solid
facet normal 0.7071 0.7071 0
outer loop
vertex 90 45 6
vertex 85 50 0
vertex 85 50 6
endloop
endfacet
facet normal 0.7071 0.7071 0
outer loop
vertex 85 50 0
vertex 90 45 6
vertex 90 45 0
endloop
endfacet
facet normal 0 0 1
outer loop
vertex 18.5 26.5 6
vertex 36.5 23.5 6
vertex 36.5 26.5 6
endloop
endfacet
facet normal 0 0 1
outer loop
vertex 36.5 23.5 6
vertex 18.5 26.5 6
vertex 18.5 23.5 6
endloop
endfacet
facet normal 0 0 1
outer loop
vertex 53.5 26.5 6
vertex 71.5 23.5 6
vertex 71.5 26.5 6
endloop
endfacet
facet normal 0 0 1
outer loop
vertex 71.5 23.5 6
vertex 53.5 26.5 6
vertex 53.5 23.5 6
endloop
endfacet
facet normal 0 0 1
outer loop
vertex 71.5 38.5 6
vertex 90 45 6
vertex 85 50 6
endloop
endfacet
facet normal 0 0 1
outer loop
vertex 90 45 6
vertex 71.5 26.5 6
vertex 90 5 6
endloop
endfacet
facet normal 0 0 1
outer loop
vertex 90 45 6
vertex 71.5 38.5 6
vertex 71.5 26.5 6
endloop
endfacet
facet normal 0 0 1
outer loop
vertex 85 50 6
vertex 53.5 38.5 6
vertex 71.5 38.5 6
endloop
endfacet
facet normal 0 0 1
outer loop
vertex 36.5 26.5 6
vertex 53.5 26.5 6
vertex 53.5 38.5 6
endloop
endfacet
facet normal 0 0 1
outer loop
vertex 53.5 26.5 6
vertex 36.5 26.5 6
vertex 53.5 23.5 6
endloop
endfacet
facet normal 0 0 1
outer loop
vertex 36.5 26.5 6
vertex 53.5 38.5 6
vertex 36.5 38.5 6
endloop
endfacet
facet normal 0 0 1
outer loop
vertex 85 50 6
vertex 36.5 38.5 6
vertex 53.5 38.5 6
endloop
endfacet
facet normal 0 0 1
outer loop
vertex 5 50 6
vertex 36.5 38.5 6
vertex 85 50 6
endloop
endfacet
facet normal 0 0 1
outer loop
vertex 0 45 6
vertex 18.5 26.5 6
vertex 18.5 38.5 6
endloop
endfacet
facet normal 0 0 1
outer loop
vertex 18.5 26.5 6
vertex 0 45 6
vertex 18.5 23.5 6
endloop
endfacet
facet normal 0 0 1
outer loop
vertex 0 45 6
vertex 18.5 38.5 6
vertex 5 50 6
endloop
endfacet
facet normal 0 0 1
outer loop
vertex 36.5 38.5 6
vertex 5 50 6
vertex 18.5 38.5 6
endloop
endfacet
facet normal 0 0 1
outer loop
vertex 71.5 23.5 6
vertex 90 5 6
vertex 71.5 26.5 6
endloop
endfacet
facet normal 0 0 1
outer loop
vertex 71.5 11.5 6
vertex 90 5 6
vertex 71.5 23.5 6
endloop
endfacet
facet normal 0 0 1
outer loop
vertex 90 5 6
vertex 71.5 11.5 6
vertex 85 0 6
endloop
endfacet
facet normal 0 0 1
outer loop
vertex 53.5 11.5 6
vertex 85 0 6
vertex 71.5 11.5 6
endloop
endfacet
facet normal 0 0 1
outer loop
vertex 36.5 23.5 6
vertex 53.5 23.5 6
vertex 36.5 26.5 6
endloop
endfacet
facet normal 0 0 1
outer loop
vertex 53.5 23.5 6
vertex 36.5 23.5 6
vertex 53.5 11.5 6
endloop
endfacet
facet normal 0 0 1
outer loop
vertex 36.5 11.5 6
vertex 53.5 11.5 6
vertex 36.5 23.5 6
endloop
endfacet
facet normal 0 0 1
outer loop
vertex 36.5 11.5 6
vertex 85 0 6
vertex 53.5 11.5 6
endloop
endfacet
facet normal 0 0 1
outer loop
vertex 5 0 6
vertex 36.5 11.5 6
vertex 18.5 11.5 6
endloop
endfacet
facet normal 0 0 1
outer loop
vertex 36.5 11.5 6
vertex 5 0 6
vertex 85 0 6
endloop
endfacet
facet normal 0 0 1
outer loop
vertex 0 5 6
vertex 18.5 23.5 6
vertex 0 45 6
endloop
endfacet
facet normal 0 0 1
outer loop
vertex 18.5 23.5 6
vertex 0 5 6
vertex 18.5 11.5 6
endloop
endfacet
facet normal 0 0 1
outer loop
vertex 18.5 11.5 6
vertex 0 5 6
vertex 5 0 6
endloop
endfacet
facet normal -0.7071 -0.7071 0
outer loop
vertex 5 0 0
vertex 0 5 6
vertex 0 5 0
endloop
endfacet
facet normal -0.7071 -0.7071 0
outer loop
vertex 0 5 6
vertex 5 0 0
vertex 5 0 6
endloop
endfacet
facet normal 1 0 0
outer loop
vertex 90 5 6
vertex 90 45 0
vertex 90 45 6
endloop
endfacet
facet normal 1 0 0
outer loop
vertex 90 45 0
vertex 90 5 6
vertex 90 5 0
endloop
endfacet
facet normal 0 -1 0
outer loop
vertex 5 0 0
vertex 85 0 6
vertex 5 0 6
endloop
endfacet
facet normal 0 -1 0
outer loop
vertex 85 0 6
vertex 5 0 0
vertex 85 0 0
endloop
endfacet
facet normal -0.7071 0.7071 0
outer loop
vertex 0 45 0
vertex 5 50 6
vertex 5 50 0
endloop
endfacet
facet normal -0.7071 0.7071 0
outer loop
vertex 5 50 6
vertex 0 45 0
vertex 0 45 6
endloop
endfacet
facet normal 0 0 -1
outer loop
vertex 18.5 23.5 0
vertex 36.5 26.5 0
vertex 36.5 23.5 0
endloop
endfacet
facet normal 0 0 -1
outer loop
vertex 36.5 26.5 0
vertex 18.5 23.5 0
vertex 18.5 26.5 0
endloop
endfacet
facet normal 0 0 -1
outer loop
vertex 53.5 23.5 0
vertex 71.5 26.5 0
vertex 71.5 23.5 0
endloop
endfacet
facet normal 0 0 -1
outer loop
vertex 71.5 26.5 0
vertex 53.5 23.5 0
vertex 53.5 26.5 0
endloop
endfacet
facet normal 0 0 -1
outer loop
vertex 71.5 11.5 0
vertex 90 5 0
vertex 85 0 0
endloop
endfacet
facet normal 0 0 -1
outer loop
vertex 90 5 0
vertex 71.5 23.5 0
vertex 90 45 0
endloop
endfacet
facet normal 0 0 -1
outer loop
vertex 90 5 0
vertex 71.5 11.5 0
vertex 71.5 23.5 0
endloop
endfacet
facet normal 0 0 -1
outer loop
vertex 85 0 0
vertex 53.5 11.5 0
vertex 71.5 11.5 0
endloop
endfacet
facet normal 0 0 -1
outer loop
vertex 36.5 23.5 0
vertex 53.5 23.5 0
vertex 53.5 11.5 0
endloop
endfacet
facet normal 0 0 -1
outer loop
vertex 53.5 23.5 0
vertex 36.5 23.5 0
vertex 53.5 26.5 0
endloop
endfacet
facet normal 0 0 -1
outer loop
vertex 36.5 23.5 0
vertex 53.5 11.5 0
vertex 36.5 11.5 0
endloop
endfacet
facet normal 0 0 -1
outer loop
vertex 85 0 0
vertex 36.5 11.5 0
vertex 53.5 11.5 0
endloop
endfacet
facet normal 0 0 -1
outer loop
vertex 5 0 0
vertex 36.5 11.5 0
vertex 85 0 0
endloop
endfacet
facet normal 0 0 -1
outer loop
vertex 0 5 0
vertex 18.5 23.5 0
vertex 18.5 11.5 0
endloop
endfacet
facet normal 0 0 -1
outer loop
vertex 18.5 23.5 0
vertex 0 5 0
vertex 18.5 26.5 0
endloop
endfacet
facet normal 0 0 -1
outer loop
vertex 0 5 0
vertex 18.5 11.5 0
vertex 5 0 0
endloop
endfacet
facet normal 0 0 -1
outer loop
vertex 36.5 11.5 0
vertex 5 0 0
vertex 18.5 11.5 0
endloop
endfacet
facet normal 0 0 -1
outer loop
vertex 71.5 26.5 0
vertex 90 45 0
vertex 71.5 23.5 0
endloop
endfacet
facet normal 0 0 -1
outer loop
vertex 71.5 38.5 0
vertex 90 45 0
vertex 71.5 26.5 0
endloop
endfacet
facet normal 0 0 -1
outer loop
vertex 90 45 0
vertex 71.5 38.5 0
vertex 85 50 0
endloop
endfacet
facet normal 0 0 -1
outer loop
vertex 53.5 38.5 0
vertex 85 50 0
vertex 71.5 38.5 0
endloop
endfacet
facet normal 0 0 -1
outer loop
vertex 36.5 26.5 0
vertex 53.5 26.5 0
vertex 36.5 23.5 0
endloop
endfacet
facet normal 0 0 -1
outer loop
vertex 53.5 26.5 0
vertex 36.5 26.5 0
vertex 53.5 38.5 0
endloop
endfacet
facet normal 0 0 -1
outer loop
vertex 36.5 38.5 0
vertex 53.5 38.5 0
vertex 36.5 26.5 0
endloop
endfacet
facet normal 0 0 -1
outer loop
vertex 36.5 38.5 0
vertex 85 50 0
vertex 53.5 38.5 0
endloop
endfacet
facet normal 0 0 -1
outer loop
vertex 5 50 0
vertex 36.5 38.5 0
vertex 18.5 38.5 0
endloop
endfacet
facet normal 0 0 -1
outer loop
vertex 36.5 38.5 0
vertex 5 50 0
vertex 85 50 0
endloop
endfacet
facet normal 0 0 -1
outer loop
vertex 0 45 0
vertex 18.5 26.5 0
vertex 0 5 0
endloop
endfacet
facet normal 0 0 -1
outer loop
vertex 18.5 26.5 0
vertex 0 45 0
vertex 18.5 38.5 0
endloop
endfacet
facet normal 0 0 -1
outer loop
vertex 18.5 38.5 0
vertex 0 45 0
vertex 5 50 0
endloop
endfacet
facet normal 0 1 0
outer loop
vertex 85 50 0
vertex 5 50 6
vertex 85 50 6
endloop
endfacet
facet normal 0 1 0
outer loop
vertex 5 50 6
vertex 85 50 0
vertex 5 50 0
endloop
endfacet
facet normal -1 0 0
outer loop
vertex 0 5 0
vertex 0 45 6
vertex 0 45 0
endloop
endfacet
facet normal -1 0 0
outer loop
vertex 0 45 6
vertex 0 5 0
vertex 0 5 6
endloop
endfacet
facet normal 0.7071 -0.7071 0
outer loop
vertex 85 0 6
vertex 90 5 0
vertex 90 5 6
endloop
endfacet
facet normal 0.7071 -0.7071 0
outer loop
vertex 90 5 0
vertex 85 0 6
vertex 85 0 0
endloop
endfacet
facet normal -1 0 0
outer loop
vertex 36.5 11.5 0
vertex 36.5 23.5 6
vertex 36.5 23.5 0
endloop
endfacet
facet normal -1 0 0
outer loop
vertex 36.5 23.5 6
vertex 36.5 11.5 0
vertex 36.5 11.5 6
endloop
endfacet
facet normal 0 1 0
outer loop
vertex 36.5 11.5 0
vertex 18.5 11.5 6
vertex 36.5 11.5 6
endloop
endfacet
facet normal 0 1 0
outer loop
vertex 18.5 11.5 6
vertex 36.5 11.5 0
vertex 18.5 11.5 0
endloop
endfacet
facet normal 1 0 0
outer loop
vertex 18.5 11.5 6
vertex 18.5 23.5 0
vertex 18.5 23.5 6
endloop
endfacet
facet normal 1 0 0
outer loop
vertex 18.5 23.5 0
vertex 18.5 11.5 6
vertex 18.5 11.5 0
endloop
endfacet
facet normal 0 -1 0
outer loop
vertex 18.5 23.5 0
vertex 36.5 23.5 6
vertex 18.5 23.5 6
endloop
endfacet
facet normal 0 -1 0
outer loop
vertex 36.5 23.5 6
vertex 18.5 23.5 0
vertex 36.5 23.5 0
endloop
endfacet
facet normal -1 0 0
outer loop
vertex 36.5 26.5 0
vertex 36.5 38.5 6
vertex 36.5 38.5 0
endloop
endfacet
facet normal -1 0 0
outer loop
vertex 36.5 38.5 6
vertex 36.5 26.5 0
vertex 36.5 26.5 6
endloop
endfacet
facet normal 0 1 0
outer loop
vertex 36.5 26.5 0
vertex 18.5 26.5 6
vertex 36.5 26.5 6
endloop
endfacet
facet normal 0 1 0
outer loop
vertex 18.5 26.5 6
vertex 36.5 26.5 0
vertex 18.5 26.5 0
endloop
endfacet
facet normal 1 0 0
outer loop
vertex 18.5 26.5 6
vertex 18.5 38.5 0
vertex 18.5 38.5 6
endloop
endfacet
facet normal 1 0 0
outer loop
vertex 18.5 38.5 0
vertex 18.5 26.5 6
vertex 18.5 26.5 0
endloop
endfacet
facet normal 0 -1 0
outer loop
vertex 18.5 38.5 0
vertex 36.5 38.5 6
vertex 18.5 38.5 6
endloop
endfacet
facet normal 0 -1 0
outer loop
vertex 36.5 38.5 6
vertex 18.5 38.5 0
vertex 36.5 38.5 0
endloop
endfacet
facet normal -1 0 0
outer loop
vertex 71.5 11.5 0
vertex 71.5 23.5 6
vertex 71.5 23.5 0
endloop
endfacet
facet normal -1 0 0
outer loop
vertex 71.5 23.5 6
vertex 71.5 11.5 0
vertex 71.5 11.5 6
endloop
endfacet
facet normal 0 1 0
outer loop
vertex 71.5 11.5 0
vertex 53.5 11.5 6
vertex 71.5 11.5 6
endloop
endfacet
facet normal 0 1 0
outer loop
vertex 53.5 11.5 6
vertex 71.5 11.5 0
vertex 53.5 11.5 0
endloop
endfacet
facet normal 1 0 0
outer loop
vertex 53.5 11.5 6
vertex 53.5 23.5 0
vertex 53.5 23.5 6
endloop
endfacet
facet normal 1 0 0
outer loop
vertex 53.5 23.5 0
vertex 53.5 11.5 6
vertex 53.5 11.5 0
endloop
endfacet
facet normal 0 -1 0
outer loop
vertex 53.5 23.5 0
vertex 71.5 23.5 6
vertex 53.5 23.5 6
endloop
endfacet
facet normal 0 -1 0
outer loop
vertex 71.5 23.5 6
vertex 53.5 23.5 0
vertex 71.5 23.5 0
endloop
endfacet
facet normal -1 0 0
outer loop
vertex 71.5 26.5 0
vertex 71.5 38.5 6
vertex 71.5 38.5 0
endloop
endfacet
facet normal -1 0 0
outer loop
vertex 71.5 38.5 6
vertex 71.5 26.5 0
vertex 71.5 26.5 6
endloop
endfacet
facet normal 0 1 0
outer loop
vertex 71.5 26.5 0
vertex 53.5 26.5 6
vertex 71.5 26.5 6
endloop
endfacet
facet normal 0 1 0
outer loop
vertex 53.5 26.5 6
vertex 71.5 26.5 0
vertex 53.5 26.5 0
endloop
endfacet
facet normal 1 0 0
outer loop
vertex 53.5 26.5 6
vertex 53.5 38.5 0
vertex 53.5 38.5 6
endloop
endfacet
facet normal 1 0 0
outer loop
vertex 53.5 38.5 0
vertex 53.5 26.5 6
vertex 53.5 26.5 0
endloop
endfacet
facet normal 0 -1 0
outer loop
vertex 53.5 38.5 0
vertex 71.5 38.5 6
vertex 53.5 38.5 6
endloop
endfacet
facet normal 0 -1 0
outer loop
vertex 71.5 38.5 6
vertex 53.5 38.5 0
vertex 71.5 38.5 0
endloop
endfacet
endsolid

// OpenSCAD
$fn = 32;

// ----------------------------------------------------------------------
// Windowed plate: 4 voids, 90 x 50 x 6 mm
// ----------------------------------------------------------------------

// --- parameters (mm) ---
plate_l = 90;             // plate length, X
plate_w = 50;             // plate width, Y
plate_t = 6;              // plate thickness, Z
edge_margin = 10;         // wall from the plate edge to any window
win_l = 18;               // pocket length
win_w = 12;               // pocket width
pitch_x = 35;             // grid pitch along X
pitch_y = 15;             // grid pitch along Y
depth_1 = 6;              // depth of void 1 (full thickness = through)
depth_2 = 6;              // depth of void 2 (full thickness = through)
depth_3 = 6;              // depth of void 3 (full thickness = through)
depth_4 = 6;              // depth of void 4 (full thickness = through)
corner_c = 5;             // corner chamfer of the plate

profile = [[5, 0], [85, 0], [90, 5], [90, 45], [85, 50], [5, 50], [0, 45], [0, 5]];  // primary outline, 8 points, counter clockwise
void_1 = [[18.5, 11.5], [36.5, 11.5], [36.5, 23.5], [18.5, 23.5]];  // pocket at grid node 0,0, 4 points
void_2 = [[18.5, 26.5], [36.5, 26.5], [36.5, 38.5], [18.5, 38.5]];  // pocket at grid node 0,1, 4 points
void_3 = [[53.5, 11.5], [71.5, 11.5], [71.5, 23.5], [53.5, 23.5]];  // pocket at grid node 1,0, 4 points
void_4 = [[53.5, 26.5], [71.5, 26.5], [71.5, 38.5], [53.5, 38.5]];  // pocket at grid node 1,1, 4 points

// --- the one profile operation ---
difference() {
  linear_extrude(height = plate_t) polygon(points = profile);
  translate([0, 0, -1])
    linear_extrude(height = plate_t + 2) polygon(points = void_1);
  translate([0, 0, -1])
    linear_extrude(height = plate_t + 2) polygon(points = void_2);
  translate([0, 0, -1])
    linear_extrude(height = plate_t + 2) polygon(points = void_3);
  translate([0, 0, -1])
    linear_extrude(height = plate_t + 2) polygon(points = void_4);
}
